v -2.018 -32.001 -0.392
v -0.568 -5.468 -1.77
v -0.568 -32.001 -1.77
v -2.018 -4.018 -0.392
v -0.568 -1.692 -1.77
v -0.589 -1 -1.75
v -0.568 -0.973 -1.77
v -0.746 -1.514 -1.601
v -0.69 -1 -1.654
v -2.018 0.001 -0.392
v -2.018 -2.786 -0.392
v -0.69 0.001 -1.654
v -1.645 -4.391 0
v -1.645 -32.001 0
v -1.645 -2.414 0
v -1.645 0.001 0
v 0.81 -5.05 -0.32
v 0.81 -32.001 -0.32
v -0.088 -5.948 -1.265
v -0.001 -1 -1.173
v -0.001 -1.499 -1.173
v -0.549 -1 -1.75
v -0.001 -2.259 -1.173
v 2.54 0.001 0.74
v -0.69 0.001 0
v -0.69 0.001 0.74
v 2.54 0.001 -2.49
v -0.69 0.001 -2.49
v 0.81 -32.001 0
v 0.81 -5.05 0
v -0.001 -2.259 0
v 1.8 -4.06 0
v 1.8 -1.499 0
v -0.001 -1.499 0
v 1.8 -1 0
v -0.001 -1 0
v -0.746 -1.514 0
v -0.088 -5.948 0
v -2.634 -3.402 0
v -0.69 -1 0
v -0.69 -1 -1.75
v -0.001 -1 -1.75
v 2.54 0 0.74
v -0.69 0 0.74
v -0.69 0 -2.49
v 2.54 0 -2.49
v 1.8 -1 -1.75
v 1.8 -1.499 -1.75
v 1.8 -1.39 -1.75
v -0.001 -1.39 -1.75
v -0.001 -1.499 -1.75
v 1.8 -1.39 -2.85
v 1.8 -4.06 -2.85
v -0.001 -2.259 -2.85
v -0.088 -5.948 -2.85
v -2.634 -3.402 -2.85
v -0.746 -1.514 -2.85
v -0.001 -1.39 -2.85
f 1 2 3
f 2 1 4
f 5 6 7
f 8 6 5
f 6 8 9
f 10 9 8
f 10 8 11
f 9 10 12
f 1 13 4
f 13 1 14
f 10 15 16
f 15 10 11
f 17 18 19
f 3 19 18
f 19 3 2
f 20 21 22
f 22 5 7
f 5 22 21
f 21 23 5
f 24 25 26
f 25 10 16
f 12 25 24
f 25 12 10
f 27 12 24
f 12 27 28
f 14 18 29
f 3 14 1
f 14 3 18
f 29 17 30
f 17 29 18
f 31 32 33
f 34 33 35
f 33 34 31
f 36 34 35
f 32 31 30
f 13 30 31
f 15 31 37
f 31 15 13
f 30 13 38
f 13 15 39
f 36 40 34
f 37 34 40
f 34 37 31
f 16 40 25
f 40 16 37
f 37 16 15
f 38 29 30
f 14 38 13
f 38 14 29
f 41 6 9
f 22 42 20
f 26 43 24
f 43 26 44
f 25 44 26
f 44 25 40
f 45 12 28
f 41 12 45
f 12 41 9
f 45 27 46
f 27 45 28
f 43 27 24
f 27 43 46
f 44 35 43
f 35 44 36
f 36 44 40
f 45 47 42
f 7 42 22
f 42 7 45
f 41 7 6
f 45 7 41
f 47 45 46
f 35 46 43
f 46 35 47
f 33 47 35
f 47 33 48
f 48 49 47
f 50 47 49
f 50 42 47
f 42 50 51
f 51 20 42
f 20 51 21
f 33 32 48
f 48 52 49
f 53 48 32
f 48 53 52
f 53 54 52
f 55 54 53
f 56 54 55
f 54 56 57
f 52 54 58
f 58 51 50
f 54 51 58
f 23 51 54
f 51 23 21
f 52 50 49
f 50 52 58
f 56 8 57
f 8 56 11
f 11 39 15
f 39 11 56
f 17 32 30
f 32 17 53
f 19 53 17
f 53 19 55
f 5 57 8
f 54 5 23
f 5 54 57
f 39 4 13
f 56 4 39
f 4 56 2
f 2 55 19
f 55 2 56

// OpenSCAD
// file: ../anti_z_fighting.scad
// https://en.wikipedia.org/wiki/Z-fighting
// Add or subtract this value to prevent Z-fighting on coplanar polygons.
anti_z_fighting_value = 0.001;
// file: ../rail.scad
include <anti_z_fighting.scad>

// The rail cutout in the sides of the card
module rail(card, distance_from_end = 0, make_printable = true) {
    rail_depth = 0.81;
    rail_flat_h = 0.32;

    mirror([0, 1, 0]) {

        // The rail that holds the card
        bottom_angle = 43.54;
        difference() {
            start = -anti_z_fighting_value;

            distance_from_end = (distance_from_end > 0) ? distance_from_end : -anti_z_fighting_value;
            end = card[1] - distance_from_end - start;

            // Removing
            union() {
                translate([rail_depth, start, -rail_flat_h])
                    rotate([0, 180 + bottom_angle, 0])
                        cube([2, end, 2]);

                translate([-2 + rail_depth, start, -rail_flat_h])
                    cube([2, end, rail_flat_h]);
            }

            // Re-adding
            translate([-5 + rail_depth, start, 0])
                cube([5, end, 5]);
        }

        pyramid_inset = 1.3 + 0.5;

        // The ramps to make slotting into the latch smooth
        translate([-1.75 / 2 + pyramid_inset, 0, -1.75 / 2]) {
            width_bottom = 3.23;
            width_top = 1.75;
            height = 1.0;

            __ramp_pyramoid(width_bottom, width_top, height);

            width_extra = 0.05 + anti_z_fighting_value;
            height_straight = 1.5; // Large enough to overlap
            translate([-width_extra / 2, height_straight / 2 - anti_z_fighting_value, 0])
                cube([width_top + width_extra, height_straight, width_top], center=true);
        }

        latch_l = 2.67;
        latch_d = pyramid_inset;
        latch_h = 2.85;
        latch_wall = 1.39;

        // The pocket that the latch bar drops into, including a 45 degree cut for printability
        translate([-anti_z_fighting_value, latch_wall, -latch_h])
            cube([latch_d + anti_z_fighting_value, latch_l, latch_h]);

        if (make_printable) {
            translate([latch_d, latch_wall + latch_l, -latch_h])
                rotate([0, 0, -180 + 45])
                    translate([0, -latch_l, 0])
                        cube([latch_d * 2, latch_l, latch_h]);
        }
    }
}

module __ramp_pyramoid(width_bottom, width_top, height) {
    points = [
        // Anti Z-fighting
        [width_bottom / 2, -anti_z_fighting_value, width_bottom / 2],
        [-width_bottom / 2, -anti_z_fighting_value, width_bottom / 2],
        [-width_bottom / 2, -anti_z_fighting_value, -width_bottom / 2],
        [width_bottom / 2, -anti_z_fighting_value, -width_bottom / 2],
        // Front
        [width_bottom / 2, 0, width_bottom / 2],
        [-width_bottom / 2, 0, width_bottom / 2],
        [-width_bottom / 2, 0, -width_bottom / 2],
        [width_bottom / 2, 0, -width_bottom / 2],
        // Rail
        [width_top / 2, height, width_top / 2],
        [-width_bottom / 2, height, width_top / 2], // Stretched
        [-width_bottom / 2, height, -width_top / 2], // Stretched
        [width_top / 2, height, -width_top / 2],
    ];

    faces = [
        [0, 1, 2, 3], // Front
        [11, 10, 9, 8], // Back
        // Perpendicular
        [0, 4, 5, 1], // Top
        [1, 5, 6, 2], // Left
        [2, 6, 7, 3], // Bottom
        [0, 3, 7, 4], // Right
        // Sloped
        [4, 8, 9, 5], // Top
        [5, 9, 10, 6], // Left
        [6, 10, 11, 7], // Bottom
        [4, 7, 11, 8], // Right
    ];

    polyhedron(points=points, faces=faces);
}
// main file
use <../rail.scad>

base = [30.0, 32.0, 6.8];

rail(base, 0, true);
